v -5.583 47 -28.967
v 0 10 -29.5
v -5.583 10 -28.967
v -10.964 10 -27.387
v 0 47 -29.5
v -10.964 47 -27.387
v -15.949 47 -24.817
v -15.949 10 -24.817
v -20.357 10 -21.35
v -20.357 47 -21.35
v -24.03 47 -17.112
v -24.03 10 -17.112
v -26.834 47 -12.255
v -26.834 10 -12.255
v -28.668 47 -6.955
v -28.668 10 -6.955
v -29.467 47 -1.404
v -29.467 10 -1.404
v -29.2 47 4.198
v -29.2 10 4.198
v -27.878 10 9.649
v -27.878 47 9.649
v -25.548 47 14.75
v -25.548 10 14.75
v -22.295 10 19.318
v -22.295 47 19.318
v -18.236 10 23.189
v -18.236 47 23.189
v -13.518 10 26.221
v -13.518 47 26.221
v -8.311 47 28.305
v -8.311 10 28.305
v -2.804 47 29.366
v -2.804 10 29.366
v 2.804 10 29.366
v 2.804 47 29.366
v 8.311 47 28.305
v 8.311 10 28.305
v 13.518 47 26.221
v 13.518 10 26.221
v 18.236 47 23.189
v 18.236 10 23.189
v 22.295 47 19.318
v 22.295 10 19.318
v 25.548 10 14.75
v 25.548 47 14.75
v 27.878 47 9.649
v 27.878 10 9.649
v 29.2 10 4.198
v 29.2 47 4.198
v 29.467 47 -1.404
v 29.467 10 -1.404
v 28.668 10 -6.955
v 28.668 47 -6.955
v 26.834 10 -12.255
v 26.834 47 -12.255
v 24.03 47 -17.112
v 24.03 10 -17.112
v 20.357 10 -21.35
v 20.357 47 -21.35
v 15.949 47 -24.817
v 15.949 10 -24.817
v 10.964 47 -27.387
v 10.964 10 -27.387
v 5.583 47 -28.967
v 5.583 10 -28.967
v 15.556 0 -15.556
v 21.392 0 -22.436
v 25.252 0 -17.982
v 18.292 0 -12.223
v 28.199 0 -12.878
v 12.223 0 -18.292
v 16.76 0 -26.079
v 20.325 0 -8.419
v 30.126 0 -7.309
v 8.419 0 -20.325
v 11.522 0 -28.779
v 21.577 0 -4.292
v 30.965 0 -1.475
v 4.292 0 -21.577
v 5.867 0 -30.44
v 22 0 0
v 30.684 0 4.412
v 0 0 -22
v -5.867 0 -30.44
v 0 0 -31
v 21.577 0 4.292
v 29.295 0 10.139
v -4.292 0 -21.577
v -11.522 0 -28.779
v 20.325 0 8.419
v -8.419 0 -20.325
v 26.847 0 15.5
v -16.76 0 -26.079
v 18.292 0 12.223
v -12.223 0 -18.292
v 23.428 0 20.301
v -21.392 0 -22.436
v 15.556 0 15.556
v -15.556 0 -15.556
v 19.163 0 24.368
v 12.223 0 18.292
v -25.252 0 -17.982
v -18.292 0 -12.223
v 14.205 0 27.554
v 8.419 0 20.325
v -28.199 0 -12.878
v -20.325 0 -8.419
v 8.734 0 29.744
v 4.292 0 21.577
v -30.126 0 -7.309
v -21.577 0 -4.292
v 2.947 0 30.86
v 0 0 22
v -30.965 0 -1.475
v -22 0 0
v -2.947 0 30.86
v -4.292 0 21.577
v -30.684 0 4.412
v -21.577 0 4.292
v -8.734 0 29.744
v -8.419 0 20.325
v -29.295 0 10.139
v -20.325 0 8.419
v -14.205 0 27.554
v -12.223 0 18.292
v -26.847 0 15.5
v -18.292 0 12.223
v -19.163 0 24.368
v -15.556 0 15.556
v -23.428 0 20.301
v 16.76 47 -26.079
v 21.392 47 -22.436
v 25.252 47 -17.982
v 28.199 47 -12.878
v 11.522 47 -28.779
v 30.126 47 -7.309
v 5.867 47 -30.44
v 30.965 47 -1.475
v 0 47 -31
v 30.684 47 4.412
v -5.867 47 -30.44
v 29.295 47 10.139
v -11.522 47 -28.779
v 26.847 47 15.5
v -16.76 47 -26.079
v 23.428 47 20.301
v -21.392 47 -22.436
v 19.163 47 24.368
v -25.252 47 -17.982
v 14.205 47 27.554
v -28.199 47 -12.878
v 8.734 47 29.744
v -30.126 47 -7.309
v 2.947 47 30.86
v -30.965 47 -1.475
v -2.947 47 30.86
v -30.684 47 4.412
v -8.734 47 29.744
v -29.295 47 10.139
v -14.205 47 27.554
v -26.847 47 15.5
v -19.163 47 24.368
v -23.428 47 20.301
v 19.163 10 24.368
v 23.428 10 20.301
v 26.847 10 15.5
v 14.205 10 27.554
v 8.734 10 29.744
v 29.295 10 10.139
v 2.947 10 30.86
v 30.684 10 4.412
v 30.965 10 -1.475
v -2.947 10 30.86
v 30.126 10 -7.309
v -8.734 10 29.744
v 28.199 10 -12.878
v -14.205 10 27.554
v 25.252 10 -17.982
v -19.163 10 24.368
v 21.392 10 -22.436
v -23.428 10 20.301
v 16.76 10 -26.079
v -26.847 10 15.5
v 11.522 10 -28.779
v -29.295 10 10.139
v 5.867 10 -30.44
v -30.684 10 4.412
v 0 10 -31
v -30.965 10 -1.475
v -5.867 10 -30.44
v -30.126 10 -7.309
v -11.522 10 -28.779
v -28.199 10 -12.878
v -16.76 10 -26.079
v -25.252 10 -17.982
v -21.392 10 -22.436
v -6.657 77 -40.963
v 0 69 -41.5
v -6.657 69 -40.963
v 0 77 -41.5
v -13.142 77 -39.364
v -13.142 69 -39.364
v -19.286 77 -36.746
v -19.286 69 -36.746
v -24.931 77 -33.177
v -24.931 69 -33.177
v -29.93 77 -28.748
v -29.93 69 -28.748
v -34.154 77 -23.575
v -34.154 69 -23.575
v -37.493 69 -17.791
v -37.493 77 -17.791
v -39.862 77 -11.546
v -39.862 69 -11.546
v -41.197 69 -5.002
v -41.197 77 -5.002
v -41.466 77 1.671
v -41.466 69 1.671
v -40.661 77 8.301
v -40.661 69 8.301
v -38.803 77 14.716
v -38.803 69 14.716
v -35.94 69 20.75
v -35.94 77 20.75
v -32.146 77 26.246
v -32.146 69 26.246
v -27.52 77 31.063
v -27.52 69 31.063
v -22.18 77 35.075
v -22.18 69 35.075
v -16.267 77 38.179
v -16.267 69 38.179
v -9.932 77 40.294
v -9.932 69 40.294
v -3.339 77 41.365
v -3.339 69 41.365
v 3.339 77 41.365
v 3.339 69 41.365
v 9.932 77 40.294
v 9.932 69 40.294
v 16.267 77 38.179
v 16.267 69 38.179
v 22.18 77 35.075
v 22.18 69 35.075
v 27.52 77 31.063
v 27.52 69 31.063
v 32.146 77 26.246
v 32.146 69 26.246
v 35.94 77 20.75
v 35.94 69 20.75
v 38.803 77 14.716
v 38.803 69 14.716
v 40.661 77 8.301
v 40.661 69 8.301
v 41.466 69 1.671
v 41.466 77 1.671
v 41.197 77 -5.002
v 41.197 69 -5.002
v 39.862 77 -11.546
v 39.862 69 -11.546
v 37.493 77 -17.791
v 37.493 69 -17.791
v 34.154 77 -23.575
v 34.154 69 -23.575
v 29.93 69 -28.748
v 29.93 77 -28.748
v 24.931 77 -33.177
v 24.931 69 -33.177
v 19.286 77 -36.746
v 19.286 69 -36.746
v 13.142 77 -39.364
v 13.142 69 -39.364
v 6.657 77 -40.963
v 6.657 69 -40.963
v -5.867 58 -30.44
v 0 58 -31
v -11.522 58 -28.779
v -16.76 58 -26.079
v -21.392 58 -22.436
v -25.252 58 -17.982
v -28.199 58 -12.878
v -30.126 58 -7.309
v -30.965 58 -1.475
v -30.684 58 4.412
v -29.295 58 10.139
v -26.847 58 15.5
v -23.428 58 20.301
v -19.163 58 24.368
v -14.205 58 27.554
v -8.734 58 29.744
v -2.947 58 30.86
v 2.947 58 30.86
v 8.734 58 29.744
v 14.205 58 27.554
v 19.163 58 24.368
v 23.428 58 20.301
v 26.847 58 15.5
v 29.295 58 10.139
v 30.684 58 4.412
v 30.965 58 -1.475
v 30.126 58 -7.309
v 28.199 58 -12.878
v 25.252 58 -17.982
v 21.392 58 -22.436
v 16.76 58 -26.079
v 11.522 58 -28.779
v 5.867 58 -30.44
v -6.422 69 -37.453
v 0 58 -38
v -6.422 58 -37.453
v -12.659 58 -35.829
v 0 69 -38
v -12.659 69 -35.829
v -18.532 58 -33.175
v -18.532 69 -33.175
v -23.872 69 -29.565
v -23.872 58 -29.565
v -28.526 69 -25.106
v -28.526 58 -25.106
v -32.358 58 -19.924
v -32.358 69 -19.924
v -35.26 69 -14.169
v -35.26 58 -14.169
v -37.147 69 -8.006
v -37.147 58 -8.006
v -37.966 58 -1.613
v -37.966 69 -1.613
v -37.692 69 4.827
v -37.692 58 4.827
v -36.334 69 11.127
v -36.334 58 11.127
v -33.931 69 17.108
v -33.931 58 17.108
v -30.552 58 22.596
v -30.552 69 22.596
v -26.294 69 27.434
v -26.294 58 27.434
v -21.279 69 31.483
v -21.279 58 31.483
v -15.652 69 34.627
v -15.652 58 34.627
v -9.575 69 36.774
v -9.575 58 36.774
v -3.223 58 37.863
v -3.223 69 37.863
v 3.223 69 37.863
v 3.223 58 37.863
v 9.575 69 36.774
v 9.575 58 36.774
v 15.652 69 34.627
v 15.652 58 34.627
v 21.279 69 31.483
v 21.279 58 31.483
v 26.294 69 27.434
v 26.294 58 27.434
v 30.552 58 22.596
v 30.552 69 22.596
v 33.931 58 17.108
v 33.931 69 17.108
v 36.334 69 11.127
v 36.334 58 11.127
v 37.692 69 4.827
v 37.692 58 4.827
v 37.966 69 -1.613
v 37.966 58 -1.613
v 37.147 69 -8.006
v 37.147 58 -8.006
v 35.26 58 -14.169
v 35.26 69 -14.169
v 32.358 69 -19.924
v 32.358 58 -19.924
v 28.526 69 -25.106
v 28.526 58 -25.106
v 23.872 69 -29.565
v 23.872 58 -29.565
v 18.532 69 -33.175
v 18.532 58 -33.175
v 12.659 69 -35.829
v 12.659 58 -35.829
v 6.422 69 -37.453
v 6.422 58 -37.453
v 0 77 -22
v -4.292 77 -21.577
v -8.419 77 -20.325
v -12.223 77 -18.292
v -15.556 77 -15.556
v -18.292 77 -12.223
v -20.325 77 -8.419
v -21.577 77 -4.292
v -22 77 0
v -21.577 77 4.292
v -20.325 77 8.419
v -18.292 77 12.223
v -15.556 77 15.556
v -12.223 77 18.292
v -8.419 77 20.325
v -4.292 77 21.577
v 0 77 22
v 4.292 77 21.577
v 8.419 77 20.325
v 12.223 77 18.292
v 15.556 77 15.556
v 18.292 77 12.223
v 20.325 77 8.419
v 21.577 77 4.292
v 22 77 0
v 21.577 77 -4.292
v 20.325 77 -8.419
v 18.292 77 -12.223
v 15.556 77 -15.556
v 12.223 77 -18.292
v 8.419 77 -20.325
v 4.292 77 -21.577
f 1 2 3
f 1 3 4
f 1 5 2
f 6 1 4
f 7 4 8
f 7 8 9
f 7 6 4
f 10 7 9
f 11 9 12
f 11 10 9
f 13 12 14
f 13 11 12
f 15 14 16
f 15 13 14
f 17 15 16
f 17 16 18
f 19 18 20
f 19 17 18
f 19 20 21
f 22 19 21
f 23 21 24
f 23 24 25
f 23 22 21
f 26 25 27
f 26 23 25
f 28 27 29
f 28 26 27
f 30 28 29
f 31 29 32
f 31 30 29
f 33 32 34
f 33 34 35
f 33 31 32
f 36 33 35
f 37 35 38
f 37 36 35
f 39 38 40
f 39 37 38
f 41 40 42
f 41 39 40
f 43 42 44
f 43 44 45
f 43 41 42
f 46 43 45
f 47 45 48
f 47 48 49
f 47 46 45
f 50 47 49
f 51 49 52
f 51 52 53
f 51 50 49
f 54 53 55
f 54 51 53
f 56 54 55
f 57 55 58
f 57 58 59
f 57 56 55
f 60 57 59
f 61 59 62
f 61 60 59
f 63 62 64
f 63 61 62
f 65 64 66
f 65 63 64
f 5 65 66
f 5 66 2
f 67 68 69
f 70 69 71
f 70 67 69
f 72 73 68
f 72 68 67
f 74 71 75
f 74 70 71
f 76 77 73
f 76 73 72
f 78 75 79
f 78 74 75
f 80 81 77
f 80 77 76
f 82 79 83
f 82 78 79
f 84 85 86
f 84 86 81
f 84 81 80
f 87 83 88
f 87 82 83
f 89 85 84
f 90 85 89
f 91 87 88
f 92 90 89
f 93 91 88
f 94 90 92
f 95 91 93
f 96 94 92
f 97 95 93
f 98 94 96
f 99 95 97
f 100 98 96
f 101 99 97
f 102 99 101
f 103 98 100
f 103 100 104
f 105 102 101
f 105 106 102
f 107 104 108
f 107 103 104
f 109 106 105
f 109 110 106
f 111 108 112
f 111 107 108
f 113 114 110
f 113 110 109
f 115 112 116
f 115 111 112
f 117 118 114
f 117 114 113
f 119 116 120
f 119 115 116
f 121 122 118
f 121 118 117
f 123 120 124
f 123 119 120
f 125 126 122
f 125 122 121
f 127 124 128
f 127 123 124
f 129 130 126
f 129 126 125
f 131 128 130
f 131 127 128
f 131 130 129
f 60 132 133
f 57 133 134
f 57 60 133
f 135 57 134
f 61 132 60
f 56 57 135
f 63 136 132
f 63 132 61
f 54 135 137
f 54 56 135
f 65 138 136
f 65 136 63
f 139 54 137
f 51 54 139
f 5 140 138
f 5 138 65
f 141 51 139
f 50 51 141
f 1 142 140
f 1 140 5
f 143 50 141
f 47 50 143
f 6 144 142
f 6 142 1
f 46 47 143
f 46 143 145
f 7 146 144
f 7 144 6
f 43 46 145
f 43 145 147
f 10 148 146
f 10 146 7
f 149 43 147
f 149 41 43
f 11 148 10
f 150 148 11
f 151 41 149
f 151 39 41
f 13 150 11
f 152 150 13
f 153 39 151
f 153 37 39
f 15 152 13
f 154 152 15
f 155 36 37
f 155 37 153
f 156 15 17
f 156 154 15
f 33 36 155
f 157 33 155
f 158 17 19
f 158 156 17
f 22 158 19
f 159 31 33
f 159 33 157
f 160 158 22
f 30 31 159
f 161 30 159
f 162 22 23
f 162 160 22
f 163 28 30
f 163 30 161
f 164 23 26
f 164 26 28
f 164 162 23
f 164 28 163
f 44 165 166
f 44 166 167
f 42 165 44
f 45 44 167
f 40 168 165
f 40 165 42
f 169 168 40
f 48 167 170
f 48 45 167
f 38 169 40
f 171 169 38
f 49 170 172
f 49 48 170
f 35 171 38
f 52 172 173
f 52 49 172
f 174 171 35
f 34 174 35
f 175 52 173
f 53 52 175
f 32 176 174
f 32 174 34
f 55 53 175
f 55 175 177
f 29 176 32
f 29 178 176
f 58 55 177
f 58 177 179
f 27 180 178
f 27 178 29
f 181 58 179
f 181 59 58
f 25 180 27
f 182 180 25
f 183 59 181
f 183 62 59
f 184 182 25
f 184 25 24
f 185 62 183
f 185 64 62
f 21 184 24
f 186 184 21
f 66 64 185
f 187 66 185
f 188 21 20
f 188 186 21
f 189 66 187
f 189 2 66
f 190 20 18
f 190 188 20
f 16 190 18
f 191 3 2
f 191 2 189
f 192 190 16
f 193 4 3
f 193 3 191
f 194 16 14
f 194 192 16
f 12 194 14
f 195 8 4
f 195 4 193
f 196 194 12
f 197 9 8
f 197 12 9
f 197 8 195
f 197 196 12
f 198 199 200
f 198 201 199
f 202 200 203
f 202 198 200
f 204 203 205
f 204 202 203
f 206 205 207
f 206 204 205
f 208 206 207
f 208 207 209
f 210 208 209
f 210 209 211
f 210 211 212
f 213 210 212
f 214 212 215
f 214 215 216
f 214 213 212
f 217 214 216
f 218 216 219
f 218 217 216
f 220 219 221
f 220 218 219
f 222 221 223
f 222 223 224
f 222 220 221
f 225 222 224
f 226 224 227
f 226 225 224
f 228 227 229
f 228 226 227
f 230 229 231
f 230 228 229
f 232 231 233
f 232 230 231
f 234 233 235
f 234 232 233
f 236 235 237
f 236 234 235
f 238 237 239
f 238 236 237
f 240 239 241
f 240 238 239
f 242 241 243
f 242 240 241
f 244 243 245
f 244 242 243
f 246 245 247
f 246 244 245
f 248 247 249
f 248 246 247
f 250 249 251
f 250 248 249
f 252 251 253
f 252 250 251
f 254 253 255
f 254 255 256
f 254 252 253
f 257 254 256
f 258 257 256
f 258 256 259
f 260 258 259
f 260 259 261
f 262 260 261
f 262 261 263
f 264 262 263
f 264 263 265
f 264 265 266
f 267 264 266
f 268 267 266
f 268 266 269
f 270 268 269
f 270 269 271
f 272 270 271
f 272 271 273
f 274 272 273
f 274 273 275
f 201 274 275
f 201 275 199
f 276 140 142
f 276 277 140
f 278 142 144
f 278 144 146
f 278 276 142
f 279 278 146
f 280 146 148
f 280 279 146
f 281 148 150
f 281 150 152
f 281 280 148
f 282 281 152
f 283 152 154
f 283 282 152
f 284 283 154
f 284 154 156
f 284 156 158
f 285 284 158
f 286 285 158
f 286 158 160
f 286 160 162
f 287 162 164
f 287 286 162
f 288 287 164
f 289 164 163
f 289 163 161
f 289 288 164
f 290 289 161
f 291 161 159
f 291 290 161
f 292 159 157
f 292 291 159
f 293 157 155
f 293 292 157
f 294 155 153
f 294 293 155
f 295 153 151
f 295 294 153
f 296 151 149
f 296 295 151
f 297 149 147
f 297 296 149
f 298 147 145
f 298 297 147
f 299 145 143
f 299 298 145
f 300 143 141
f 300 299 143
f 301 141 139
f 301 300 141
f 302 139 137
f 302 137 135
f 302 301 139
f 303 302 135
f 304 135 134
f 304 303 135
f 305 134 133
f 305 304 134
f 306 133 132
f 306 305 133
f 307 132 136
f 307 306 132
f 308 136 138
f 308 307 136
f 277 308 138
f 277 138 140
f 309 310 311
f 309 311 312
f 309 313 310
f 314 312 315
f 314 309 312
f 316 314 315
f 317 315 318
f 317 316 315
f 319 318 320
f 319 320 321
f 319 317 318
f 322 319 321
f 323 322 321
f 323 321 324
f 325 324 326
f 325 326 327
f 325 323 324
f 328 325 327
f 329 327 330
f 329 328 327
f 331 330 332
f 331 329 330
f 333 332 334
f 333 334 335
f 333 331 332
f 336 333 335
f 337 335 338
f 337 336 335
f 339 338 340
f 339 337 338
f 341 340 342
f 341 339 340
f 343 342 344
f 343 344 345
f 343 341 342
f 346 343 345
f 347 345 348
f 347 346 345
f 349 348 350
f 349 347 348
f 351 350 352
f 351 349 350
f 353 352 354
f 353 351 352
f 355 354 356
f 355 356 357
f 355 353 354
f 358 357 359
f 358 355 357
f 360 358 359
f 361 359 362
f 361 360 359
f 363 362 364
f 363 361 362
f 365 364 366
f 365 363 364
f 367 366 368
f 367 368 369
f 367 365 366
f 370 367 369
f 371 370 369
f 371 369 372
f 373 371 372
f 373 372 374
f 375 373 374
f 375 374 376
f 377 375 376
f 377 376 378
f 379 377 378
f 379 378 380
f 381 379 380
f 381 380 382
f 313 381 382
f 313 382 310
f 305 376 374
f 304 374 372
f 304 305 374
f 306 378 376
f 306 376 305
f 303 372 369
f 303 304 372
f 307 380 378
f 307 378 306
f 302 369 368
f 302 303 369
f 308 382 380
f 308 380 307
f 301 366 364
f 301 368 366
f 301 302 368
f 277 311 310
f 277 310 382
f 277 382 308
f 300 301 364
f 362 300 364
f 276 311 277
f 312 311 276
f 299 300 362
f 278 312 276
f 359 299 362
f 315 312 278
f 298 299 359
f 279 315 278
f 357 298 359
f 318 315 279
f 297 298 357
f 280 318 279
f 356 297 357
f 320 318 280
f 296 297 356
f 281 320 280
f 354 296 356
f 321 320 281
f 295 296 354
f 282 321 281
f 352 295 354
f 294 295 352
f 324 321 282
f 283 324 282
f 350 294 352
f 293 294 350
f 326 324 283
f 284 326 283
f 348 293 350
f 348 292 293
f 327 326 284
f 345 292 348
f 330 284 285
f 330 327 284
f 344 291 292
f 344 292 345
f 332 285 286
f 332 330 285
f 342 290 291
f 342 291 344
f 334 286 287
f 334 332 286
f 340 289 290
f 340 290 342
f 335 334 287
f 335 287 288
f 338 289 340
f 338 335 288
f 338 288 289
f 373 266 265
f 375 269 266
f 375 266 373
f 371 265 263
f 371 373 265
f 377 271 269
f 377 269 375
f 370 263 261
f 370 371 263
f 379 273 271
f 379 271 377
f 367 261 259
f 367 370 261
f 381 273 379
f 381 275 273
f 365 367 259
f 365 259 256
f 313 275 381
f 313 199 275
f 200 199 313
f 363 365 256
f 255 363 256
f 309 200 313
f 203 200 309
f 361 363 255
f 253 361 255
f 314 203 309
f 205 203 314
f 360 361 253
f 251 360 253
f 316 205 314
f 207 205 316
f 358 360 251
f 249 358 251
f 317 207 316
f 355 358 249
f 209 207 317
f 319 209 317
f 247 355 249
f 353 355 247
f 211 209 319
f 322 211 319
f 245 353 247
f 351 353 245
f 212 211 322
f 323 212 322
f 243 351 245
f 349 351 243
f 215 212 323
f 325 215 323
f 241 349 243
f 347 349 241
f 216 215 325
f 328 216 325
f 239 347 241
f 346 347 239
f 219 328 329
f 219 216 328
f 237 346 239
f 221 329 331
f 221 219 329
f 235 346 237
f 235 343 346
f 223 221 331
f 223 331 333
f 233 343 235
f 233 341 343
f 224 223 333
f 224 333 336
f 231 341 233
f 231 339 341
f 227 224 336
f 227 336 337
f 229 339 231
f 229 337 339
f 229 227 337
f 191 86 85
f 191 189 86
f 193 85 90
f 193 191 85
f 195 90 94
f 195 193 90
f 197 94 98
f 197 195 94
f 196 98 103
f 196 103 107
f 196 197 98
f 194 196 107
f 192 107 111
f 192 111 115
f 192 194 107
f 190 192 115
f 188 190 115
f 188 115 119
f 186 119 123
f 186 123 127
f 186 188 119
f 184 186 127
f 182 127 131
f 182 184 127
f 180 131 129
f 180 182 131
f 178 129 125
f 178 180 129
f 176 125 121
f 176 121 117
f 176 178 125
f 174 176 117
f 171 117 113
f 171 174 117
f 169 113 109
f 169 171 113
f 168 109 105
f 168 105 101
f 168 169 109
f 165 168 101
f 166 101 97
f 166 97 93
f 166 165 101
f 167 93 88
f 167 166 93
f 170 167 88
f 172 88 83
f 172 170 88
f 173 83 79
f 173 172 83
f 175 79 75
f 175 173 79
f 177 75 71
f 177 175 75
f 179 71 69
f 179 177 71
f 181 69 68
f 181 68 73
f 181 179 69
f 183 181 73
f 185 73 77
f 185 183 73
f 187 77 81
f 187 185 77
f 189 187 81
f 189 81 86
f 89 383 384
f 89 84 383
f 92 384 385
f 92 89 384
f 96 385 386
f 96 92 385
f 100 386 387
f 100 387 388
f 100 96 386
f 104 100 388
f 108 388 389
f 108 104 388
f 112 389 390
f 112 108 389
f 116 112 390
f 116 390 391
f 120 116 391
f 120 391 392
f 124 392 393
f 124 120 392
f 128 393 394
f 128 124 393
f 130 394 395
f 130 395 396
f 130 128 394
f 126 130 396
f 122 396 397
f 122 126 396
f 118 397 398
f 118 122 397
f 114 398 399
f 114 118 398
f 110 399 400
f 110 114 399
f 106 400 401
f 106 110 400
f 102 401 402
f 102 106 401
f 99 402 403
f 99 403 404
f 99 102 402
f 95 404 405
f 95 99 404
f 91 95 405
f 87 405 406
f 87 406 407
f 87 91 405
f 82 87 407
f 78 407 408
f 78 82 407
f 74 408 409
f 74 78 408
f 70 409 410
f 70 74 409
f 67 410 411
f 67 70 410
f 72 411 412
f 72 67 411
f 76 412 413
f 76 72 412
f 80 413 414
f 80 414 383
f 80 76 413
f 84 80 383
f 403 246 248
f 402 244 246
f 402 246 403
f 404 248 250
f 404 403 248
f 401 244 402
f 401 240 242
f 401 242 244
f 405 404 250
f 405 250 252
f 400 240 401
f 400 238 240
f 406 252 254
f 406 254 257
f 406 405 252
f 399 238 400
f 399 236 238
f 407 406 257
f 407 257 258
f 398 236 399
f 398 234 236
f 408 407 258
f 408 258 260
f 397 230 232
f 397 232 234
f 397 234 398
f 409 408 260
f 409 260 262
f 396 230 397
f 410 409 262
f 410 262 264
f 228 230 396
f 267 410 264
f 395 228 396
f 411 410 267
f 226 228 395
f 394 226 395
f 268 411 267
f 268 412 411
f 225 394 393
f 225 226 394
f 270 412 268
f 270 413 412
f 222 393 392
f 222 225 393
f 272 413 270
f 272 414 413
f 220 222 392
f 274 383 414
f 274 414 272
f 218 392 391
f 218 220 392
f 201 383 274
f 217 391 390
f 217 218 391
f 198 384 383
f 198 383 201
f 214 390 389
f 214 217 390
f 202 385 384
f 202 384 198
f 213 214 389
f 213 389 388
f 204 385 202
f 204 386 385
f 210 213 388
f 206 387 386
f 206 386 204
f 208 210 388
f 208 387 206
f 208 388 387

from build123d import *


with BuildPart() as part:
    # Sketch1 → Revolve1 (revolve)
    with BuildSketch(Plane.XY, mode=Mode.PRIVATE) as revolve1_sk:
        Polygon((22, 0), (31, 0), (31, 10), (29.5, 10), (29.5, 47), (31, 47), (31, 58), (38, 58), (38, 69), (41.5, 69), (41.5, 77), (22, 77), align=None)
    revolve(revolve1_sk.sketch.rotate(Axis((0, 0, 0), (0, 1, 0)), 90), axis=Axis((0, 0, 0), (0, 1, 0)))  # turned: the seam where the file's is


solid = part.part
